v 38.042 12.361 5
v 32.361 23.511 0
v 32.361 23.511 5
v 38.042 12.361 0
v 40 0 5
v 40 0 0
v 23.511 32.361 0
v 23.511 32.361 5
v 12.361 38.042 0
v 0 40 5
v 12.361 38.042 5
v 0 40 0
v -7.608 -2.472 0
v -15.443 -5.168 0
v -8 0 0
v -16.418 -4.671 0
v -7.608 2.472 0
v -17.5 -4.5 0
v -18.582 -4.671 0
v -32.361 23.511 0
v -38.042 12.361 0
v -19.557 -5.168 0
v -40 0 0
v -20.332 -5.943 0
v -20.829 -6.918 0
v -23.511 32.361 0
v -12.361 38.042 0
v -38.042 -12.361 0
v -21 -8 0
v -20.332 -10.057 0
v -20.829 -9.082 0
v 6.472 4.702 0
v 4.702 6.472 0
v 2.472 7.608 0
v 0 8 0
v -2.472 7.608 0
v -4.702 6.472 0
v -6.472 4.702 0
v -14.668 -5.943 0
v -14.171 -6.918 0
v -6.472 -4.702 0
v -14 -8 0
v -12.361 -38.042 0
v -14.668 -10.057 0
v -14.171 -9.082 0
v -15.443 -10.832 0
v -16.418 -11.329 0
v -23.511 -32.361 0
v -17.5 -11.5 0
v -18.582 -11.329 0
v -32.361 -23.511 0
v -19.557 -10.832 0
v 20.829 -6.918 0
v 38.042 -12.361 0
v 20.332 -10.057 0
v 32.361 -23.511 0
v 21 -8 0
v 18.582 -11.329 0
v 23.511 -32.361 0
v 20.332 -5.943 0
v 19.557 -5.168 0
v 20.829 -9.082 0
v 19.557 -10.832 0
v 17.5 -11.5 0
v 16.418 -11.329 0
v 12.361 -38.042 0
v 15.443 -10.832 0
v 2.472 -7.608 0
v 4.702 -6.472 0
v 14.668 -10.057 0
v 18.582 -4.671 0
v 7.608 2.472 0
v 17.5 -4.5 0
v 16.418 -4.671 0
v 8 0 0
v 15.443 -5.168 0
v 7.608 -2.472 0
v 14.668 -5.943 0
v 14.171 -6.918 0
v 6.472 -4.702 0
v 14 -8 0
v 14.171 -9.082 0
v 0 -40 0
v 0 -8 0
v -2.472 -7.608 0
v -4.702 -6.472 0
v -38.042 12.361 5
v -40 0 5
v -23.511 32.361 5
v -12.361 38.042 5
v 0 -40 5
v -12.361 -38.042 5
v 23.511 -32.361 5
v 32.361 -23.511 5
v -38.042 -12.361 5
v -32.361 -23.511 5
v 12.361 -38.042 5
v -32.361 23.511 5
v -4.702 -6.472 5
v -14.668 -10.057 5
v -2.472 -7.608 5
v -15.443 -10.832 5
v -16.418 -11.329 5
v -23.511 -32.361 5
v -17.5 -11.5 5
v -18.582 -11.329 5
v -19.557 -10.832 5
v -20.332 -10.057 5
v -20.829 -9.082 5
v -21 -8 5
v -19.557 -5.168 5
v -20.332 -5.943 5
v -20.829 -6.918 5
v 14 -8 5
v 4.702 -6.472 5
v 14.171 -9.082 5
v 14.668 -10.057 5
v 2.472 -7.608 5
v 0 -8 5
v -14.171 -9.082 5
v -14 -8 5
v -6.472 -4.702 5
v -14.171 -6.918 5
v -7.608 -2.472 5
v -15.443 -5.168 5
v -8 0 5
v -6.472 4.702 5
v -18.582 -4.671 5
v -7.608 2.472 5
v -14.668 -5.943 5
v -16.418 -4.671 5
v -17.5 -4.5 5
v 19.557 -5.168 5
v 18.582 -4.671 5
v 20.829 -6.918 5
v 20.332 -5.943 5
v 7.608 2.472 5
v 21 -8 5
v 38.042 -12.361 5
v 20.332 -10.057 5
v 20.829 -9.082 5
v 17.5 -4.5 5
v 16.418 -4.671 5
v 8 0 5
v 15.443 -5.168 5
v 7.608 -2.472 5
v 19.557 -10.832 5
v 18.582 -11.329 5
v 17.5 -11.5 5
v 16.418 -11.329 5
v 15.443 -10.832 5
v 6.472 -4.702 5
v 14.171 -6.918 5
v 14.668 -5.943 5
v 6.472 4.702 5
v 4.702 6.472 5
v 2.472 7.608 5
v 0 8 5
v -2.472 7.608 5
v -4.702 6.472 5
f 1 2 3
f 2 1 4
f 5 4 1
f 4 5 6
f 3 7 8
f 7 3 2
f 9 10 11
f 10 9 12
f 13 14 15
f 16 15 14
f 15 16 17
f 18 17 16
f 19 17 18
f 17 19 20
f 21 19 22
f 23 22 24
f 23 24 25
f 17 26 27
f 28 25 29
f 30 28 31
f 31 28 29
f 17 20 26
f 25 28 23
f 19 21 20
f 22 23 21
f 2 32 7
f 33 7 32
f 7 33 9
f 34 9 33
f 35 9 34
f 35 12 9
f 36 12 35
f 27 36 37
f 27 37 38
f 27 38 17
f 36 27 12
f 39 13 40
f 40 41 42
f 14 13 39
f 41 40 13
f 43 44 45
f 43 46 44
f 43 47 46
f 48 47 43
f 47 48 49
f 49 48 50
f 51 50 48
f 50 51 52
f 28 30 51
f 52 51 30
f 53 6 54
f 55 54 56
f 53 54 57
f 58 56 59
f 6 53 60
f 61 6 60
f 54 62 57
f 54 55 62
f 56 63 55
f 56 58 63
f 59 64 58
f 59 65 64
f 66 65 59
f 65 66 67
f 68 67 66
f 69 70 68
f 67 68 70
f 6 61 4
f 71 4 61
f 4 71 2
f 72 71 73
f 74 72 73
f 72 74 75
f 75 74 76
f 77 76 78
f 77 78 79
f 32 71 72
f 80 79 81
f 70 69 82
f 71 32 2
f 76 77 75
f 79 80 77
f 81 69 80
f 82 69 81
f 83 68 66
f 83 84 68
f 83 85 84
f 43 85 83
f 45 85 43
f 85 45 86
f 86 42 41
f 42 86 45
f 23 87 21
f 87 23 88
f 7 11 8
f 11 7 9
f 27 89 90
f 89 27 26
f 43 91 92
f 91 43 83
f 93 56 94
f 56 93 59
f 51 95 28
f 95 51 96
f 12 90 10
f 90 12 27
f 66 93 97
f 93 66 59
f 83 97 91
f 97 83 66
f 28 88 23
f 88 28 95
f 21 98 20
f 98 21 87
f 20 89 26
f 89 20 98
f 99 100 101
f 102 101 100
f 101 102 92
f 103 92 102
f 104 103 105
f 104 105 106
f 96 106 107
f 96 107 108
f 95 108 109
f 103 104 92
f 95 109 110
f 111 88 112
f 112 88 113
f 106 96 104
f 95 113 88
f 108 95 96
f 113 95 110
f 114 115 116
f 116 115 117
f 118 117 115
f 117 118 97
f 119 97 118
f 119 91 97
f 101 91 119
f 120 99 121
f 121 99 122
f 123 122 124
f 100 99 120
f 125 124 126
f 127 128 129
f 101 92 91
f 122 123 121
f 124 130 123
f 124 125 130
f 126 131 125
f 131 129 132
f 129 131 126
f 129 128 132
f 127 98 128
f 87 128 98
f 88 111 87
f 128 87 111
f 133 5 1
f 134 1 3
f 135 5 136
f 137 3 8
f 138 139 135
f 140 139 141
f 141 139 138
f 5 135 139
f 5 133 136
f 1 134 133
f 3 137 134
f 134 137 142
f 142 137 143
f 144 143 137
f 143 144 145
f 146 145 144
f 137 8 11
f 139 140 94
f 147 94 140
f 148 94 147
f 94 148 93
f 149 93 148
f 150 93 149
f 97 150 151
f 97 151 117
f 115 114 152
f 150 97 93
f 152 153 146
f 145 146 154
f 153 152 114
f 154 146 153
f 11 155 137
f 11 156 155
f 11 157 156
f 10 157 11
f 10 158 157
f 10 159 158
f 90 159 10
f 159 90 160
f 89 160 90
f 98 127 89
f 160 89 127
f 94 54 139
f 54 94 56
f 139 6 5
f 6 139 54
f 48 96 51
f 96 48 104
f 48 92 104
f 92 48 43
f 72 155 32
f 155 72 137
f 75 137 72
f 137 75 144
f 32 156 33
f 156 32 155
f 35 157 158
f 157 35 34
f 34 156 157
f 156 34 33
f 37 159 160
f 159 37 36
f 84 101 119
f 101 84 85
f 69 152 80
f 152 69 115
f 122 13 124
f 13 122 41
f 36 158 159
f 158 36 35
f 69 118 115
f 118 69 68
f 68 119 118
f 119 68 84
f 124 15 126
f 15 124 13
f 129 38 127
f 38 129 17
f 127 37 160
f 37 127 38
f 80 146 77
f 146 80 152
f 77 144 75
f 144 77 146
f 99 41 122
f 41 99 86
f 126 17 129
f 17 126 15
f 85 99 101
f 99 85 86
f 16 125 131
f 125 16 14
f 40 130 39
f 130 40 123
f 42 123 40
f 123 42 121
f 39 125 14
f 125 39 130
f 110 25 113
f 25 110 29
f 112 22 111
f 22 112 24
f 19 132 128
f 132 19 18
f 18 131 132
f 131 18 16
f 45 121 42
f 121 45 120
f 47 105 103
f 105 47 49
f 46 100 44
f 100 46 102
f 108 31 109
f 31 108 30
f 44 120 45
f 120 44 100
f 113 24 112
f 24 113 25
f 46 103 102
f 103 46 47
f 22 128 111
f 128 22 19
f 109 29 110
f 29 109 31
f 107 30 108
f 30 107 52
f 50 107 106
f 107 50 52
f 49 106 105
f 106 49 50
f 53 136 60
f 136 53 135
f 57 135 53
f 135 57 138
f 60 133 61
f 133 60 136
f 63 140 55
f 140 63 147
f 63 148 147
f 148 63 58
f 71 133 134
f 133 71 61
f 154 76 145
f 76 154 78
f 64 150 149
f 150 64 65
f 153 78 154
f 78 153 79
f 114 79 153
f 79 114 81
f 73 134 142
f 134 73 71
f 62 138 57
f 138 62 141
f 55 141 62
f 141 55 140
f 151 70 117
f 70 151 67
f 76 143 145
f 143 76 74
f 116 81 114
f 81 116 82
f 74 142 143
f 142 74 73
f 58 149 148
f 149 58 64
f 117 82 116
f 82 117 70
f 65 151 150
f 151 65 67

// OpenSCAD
$fn=20;

thickness = 5;

difference(){ 
cylinder(h=thickness, d=80, center=false);
cylinder(h=thickness, d=16, center=false);
translate([-35/2,-8,0]) 
	cylinder(h=thickness,r=3.5,center=false);
translate([35/2,-8,0])
	cylinder(h=thickness,r=3.5,center=false);
}
